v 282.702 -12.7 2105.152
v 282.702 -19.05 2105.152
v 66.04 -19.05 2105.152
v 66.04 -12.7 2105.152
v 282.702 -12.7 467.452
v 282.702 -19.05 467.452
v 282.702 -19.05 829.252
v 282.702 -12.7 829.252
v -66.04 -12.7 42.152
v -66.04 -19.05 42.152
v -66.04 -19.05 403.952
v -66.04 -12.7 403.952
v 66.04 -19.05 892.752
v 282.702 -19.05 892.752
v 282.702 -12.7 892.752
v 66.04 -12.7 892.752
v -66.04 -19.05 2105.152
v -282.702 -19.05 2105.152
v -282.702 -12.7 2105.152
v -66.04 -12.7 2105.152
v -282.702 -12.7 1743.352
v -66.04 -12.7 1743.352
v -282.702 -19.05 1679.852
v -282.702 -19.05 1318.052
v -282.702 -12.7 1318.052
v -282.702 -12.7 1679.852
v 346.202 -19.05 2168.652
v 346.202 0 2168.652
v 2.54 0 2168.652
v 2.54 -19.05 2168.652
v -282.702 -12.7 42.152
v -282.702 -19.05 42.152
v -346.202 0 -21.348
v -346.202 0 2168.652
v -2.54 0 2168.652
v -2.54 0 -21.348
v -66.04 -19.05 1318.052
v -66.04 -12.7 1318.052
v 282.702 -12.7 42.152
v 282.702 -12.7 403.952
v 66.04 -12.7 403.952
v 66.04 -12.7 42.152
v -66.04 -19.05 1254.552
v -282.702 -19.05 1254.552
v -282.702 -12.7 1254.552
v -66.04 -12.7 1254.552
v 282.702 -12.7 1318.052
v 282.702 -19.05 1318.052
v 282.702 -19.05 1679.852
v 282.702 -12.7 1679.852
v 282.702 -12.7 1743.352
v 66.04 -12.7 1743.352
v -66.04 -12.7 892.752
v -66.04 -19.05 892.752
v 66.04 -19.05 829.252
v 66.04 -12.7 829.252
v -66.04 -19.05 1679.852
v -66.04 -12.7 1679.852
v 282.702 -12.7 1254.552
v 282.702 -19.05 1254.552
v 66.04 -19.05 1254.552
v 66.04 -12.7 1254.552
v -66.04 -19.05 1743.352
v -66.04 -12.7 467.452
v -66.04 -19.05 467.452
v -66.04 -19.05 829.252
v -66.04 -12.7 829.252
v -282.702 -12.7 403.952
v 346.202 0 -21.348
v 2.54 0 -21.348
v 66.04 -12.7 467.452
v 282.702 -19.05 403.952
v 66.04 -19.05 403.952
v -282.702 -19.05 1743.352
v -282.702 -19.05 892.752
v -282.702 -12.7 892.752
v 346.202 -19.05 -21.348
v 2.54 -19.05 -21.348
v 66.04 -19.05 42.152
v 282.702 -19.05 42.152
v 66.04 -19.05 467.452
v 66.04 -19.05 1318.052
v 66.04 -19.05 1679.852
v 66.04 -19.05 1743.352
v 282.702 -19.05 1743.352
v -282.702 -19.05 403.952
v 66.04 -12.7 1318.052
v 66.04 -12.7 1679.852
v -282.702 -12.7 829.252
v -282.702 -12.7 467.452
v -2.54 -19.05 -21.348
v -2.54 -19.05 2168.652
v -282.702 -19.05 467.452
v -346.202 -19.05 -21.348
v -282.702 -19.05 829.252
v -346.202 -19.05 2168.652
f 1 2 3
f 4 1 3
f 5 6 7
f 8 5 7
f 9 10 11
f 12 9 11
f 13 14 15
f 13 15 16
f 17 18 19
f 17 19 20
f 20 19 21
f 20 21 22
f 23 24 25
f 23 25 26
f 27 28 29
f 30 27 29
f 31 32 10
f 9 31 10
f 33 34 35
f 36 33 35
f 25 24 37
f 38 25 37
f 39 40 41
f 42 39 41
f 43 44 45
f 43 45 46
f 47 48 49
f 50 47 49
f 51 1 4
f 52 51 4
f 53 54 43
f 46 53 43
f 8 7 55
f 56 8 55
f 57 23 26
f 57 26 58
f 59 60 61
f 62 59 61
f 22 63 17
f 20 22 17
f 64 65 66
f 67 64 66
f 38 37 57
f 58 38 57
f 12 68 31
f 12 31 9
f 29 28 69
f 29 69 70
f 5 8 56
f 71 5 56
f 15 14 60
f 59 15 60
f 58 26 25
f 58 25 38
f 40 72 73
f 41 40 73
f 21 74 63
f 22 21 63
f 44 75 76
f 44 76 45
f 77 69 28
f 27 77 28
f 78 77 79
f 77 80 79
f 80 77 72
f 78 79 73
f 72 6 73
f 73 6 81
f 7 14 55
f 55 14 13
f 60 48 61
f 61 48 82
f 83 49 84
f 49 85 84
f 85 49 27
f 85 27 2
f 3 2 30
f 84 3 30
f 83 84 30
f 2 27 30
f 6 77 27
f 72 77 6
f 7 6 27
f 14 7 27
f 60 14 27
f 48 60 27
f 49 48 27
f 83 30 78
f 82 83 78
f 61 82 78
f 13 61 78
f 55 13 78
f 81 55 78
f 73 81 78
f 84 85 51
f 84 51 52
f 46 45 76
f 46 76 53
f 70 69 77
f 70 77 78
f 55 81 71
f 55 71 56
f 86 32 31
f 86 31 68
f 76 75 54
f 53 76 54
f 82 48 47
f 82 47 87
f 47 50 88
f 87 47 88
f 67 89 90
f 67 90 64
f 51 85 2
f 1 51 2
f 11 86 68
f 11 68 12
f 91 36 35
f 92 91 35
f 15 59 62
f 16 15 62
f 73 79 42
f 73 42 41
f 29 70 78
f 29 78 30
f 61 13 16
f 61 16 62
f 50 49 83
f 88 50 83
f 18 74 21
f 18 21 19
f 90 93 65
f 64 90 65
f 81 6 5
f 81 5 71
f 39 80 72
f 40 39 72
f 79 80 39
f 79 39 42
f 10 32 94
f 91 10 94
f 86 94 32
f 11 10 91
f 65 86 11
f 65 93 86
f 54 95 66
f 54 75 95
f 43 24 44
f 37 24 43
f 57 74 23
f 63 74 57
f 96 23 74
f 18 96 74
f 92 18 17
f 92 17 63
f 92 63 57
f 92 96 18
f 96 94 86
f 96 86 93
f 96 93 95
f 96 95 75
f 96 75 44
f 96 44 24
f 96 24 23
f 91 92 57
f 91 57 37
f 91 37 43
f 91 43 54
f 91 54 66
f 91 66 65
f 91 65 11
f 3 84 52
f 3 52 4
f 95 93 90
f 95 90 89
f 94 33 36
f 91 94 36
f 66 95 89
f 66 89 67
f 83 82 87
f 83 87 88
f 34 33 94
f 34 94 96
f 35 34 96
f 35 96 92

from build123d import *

# Parameters (mm, degrees)
F1_W     = 343.662
F1_H     = 2190
F2_DEPTH = 19.05
F3_W     = 216.662
F3_H     = 361.8
F4_DEPTH = 6.35


with BuildPart() as f2:
    # F1 (on Front) → F2 (new body)
    with BuildSketch(Plane.XZ):
        with Locations((-174.371, 1073.652)):
            Rectangle(F1_W, F1_H)
    extrude(amount=F2_DEPTH)

    # F3 (on face) → F4 (cut)
    with BuildSketch(Plane.XZ.offset(19.05)):
        with Locations((-174.371, 223.052)):
            Rectangle(F3_W, F3_H)
        with Locations((-174.371, 648.352)):
            Rectangle(F3_W, F3_H)
        with Locations((-174.371, 1073.652)):
            Rectangle(F3_W, F3_H)
        with Locations((-174.371, 1498.952)):
            Rectangle(F3_W, F3_H)
        with Locations((-174.371, 1924.252)):
            Rectangle(F3_W, F3_H)
    extrude(amount=-F4_DEPTH, mode=Mode.SUBTRACT)


with BuildPart() as f5_1:
    # F5: instance of F2
    add(f2.part.mirror(Plane.YZ))


solid = Compound([f2.part, f5_1.part])
